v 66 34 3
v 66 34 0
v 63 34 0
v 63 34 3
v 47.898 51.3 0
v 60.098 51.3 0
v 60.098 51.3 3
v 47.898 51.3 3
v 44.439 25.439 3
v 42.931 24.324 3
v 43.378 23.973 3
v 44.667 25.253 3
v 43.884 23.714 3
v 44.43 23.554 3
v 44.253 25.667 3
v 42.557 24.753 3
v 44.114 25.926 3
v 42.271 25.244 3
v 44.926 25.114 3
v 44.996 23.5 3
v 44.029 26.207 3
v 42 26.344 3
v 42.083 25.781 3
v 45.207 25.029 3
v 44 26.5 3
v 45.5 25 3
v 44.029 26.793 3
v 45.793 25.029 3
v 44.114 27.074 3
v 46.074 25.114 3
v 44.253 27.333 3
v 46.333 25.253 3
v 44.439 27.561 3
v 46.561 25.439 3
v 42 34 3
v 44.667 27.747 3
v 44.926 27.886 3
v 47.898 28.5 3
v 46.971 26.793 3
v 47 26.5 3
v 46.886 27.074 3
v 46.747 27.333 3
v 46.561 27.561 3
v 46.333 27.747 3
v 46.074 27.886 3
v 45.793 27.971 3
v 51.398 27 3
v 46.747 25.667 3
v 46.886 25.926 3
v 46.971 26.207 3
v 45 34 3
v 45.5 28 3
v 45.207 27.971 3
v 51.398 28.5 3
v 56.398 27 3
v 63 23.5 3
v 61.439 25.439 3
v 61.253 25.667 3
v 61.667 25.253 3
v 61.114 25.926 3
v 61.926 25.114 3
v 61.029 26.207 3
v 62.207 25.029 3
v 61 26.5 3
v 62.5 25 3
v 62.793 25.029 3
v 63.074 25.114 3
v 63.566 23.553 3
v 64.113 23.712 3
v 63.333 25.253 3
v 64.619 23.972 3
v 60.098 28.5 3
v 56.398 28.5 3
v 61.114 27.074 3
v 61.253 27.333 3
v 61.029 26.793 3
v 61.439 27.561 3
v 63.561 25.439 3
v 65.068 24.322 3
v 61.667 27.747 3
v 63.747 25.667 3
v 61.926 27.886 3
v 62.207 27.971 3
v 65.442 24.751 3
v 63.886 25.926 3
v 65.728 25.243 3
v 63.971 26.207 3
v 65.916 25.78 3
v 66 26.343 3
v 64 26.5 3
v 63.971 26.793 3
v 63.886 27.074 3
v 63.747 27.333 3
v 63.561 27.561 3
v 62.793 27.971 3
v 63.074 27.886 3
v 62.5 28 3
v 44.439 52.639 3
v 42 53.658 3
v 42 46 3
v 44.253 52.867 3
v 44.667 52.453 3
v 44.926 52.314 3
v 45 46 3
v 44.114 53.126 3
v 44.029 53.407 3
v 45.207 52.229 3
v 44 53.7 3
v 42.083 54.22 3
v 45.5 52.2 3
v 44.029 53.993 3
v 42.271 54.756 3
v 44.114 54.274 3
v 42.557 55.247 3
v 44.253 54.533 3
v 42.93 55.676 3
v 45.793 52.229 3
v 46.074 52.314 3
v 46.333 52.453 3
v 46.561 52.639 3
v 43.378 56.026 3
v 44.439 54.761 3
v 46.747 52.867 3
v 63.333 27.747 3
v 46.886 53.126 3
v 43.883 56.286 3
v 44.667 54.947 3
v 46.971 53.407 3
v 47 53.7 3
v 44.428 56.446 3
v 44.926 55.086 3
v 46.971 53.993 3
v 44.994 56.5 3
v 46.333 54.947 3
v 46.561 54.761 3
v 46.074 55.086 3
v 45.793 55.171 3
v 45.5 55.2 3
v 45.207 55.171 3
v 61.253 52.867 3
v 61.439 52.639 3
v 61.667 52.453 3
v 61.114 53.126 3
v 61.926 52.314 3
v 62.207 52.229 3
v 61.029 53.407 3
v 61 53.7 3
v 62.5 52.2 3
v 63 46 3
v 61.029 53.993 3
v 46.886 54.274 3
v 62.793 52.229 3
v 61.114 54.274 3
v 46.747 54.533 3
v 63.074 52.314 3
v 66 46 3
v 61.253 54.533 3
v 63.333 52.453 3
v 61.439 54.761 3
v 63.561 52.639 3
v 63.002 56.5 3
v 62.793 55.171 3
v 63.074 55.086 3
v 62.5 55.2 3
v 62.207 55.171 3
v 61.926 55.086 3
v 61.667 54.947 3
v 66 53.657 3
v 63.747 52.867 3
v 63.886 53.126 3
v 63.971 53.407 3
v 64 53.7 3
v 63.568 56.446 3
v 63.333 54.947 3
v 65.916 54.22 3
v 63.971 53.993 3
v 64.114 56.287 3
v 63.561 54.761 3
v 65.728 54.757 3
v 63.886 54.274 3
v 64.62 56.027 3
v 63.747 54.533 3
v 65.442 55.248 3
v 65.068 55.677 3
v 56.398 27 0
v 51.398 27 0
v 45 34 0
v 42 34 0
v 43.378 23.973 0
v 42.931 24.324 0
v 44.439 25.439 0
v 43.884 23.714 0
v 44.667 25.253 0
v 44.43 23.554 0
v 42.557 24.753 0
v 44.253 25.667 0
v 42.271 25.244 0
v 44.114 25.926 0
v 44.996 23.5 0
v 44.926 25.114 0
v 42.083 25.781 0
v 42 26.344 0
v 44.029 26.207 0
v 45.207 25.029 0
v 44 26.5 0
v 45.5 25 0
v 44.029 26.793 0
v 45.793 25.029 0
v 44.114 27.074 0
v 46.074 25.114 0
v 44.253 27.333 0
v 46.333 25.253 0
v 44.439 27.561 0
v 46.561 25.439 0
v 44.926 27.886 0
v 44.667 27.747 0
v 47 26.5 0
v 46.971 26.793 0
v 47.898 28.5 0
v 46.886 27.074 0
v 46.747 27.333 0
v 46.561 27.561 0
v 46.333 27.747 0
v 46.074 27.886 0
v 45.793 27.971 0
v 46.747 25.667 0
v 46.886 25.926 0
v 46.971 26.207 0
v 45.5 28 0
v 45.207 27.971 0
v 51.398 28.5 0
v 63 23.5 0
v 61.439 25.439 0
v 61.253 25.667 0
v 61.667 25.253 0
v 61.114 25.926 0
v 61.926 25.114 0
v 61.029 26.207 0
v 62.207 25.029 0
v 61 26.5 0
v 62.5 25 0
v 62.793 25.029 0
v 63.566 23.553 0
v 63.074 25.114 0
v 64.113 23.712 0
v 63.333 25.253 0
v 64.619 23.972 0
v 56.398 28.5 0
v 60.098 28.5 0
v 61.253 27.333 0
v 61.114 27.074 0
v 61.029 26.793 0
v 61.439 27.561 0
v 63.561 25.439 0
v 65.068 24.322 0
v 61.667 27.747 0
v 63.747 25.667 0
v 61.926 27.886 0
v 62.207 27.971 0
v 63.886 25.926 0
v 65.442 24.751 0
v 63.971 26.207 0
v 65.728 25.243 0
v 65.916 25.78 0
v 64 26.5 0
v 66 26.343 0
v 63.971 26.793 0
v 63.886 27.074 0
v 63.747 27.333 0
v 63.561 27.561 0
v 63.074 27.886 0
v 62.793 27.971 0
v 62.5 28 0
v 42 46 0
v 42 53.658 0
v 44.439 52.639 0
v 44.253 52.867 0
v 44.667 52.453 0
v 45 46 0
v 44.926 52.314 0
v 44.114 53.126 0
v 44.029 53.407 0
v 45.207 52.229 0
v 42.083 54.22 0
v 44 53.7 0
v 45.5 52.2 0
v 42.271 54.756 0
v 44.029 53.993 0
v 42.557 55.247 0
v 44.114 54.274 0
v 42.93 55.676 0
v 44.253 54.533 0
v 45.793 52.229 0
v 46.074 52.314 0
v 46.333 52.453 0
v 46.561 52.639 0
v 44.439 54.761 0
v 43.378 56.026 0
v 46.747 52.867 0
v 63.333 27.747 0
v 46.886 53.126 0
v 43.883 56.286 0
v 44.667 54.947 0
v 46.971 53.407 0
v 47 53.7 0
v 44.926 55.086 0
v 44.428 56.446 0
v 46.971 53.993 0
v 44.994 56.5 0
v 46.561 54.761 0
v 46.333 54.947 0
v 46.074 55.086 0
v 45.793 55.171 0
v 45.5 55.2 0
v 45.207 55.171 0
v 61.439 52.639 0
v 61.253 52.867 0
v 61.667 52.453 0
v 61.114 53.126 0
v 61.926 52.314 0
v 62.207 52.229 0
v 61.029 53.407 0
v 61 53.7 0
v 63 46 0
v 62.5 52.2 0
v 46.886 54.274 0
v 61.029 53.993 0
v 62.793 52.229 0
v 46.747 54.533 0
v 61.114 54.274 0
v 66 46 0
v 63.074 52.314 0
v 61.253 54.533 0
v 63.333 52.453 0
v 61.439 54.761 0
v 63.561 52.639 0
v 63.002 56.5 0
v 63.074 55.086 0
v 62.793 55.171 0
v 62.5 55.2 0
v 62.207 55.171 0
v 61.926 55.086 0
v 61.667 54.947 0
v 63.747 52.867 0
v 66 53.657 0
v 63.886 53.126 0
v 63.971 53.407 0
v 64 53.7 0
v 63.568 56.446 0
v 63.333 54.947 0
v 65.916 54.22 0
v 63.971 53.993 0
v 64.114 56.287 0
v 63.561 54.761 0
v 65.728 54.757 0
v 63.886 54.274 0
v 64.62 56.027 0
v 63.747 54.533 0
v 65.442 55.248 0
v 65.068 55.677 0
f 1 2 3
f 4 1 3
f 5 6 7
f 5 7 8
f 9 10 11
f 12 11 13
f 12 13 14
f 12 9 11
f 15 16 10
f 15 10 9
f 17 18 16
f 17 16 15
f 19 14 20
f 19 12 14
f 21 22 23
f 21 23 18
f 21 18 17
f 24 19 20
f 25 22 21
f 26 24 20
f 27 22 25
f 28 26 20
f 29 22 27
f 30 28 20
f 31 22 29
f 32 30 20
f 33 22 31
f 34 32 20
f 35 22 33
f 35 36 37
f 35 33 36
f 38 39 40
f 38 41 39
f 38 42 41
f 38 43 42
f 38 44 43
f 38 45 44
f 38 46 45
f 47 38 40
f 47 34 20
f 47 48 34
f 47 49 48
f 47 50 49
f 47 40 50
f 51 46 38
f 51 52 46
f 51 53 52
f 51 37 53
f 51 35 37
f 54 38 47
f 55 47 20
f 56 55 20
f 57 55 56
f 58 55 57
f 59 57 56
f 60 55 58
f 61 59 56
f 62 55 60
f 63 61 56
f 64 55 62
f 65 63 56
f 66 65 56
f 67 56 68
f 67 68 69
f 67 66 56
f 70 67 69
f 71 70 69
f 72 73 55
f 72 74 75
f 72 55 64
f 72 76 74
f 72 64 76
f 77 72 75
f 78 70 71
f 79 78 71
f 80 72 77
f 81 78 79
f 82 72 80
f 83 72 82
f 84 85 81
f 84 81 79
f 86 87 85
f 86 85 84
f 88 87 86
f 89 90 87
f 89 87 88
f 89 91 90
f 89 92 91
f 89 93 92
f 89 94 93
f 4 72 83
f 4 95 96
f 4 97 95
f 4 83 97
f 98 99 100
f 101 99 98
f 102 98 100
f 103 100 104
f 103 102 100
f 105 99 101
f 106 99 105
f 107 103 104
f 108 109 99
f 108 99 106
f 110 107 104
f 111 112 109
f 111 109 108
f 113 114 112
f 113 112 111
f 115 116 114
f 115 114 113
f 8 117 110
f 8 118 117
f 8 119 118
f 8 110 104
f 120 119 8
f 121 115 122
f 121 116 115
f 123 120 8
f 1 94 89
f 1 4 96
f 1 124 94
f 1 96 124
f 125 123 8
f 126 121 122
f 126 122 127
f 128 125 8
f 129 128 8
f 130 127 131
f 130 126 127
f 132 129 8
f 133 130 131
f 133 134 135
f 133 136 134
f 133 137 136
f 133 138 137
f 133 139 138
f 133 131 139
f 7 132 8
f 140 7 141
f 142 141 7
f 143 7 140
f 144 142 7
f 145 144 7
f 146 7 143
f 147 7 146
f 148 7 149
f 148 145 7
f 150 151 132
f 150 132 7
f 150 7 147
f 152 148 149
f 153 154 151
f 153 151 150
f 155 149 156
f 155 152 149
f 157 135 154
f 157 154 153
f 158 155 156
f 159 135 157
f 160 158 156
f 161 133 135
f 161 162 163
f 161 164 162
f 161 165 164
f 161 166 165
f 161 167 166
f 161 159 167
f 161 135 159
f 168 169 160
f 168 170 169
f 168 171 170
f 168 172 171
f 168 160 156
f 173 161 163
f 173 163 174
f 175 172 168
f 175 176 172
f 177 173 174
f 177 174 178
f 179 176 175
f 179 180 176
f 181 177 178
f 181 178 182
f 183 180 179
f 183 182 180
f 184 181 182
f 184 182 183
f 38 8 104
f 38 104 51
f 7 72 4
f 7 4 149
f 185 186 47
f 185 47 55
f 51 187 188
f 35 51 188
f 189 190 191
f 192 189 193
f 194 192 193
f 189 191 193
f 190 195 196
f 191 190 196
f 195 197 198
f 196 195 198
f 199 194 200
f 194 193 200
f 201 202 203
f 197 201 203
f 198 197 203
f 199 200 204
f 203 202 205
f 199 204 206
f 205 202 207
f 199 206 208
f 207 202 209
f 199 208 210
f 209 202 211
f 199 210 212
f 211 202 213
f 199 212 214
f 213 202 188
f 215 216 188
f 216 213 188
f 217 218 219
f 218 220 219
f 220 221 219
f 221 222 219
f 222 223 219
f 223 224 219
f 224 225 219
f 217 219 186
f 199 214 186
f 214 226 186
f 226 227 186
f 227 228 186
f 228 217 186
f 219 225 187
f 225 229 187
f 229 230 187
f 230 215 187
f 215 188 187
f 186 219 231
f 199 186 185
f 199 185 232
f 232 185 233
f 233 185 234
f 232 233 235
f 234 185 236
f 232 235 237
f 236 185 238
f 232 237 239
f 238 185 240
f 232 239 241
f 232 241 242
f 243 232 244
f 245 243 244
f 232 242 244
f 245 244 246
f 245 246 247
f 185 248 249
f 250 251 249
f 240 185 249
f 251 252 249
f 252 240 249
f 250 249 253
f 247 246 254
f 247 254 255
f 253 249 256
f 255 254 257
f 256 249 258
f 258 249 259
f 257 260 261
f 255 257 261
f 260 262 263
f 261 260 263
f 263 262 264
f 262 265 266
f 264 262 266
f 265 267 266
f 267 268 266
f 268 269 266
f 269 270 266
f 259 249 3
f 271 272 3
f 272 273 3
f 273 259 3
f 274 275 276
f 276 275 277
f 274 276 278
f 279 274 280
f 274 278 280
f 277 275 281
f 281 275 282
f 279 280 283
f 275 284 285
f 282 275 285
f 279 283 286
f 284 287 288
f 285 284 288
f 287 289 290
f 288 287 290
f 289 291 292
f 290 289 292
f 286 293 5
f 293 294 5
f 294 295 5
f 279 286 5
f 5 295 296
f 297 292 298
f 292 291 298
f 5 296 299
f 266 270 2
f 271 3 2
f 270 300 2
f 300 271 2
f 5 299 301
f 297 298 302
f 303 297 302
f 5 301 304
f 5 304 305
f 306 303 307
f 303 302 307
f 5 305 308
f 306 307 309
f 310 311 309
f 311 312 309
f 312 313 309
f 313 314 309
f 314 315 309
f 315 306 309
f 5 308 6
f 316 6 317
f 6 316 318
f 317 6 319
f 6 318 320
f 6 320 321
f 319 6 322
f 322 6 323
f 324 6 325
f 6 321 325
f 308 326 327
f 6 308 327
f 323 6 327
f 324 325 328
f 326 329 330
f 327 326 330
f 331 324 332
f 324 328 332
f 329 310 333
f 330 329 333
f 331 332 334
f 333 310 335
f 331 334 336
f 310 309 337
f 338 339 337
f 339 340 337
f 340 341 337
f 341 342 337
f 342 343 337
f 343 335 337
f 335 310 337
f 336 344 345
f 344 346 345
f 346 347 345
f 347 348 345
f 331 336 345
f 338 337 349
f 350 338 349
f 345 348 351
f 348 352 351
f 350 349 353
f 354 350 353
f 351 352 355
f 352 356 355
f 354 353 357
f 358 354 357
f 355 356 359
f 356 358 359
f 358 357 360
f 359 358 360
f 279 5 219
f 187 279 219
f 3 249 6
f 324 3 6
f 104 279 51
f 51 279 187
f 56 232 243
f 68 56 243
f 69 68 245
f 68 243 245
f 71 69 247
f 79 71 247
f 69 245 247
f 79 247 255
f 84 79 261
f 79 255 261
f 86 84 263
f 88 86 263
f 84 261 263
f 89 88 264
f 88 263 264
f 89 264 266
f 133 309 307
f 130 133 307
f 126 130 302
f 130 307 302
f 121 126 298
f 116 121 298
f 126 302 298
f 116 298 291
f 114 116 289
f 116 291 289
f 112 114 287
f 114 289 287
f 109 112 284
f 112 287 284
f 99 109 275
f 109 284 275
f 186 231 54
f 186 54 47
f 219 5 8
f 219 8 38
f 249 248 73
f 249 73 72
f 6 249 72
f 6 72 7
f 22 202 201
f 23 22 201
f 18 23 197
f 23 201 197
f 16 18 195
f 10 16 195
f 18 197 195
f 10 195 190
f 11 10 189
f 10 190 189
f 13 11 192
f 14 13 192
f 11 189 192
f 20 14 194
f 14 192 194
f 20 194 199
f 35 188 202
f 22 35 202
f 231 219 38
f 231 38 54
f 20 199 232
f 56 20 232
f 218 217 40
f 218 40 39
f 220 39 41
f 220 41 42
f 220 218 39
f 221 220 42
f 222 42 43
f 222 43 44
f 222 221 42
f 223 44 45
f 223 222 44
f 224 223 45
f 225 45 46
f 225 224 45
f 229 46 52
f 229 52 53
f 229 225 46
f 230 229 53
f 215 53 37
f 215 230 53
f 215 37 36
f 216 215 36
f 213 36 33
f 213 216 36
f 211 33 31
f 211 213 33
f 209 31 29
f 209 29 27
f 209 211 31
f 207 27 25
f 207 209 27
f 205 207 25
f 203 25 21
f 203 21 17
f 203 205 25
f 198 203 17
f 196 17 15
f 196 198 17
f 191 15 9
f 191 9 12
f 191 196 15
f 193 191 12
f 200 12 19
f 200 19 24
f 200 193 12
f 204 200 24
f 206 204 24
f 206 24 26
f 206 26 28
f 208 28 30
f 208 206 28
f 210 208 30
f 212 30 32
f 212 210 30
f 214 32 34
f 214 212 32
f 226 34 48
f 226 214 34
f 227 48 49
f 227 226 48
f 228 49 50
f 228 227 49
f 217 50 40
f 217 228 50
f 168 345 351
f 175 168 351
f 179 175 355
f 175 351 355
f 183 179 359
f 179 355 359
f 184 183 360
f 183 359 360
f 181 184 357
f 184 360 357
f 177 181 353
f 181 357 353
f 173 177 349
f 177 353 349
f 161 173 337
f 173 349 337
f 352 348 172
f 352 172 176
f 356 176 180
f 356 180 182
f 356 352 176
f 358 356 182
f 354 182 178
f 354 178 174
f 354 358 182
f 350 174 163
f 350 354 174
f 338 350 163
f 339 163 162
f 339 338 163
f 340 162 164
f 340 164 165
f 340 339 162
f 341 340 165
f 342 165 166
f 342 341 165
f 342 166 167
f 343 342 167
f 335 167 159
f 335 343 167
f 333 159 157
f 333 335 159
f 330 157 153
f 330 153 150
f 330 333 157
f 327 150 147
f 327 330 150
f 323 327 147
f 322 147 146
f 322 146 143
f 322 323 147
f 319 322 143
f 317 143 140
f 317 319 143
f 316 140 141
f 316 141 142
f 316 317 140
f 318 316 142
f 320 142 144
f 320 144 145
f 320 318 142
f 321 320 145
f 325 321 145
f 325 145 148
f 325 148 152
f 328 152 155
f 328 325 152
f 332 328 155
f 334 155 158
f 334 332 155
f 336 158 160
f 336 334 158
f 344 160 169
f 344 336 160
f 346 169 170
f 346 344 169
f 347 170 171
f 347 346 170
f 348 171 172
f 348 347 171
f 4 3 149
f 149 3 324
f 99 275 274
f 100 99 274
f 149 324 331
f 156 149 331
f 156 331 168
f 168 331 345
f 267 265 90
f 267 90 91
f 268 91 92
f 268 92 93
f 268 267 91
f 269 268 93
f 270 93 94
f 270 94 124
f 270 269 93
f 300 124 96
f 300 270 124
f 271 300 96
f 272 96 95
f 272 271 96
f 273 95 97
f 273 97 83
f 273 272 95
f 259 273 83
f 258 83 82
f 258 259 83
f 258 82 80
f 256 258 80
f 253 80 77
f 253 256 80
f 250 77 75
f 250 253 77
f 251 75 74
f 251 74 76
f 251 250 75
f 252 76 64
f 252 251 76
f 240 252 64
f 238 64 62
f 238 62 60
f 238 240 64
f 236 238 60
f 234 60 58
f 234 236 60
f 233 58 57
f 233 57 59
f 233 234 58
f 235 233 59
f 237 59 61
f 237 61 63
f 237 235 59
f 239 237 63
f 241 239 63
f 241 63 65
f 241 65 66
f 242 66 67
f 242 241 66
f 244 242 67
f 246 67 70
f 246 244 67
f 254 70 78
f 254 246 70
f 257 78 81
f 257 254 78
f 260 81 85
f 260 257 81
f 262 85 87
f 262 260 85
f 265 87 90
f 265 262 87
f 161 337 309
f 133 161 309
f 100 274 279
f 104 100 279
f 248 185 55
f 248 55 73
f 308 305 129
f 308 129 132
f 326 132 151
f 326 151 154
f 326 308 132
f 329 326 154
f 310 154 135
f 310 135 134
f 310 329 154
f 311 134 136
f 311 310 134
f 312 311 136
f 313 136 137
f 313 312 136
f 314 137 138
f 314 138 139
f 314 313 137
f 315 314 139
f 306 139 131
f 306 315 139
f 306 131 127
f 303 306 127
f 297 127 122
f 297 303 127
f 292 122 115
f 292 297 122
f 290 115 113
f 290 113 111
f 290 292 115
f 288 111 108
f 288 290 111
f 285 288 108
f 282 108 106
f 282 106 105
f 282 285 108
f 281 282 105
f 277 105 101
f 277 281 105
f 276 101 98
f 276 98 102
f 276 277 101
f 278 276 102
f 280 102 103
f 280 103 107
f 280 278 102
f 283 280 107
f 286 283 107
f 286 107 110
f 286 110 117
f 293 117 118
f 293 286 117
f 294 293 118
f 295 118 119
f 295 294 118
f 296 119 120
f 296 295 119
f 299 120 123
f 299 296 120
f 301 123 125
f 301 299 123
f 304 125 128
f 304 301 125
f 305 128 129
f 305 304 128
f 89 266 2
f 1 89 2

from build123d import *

# Parameters (mm, degrees)
MODEL_R             = 1.5
MODEL_R_2           = 1.500000002
MODEL_R_3           = 1.500000008
BOSS_EXTRUDE1_DEPTH = 3


with BuildPart() as part:
    # Model → Boss-Extrude1 (new body)
    with BuildSketch(Plane.XY):
        with BuildLine():
            Line((41.999920867, 34), (41.999920867, 26.34355613))
            ThreePointArc((41.999920867, 26.34355613), (42.930559932, 24.324015901), (44.9959, 23.5))
            Line((44.9959, 23.5), (62.9999, 23.5))
            ThreePointArc((62.9999, 23.5), (65.067553671, 24.322356447), (65.9999, 26.3428))
            Line((65.9999, 26.3428), (65.9999, 34))
            Line((65.9999, 34), (62.9999, 34))
            Line((62.9999, 34), (62.9999, 46))
            Line((62.9999, 46), (65.9999, 46))
            Line((65.9999, 46), (65.9999, 53.6572))
            ThreePointArc((65.9999, 53.6572), (65.068322251, 55.676912854), (63.002020078, 56.5))
            Line((63.002020078, 56.5), (44.993779922, 56.5))
            ThreePointArc((44.993779922, 56.5), (42.930289539, 55.675803247), (41.999920867, 53.65795613))
            Line((41.999920867, 53.65795613), (41.999920867, 46))
            Line((41.999920867, 46), (44.999920867, 46))
            Line((44.999920867, 46), (44.999920867, 34))
            Line((44.999920867, 34), (41.999920867, 34))
        make_face()
        with Locations((45.4999, 53.700050007)):
            Circle(MODEL_R, mode=Mode.SUBTRACT)
        with Locations((62.4999, 53.700099998)):
            Circle(MODEL_R_2, mode=Mode.SUBTRACT)
        with Locations((45.4999, 26.500000005)):
            Circle(MODEL_R_3, mode=Mode.SUBTRACT)
        with Locations((62.4999, 26.500049996)):
            Circle(MODEL_R, mode=Mode.SUBTRACT)
        Polygon((47.8979, 51.3), (47.8979, 28.5), (51.3979, 28.5), (51.3979, 27), (56.3979, 27), (56.3979, 28.5), (60.0979, 28.5), (60.0979, 51.3), align=None, mode=Mode.SUBTRACT)
    extrude(amount=BOSS_EXTRUDE1_DEPTH)


solid = part.part
